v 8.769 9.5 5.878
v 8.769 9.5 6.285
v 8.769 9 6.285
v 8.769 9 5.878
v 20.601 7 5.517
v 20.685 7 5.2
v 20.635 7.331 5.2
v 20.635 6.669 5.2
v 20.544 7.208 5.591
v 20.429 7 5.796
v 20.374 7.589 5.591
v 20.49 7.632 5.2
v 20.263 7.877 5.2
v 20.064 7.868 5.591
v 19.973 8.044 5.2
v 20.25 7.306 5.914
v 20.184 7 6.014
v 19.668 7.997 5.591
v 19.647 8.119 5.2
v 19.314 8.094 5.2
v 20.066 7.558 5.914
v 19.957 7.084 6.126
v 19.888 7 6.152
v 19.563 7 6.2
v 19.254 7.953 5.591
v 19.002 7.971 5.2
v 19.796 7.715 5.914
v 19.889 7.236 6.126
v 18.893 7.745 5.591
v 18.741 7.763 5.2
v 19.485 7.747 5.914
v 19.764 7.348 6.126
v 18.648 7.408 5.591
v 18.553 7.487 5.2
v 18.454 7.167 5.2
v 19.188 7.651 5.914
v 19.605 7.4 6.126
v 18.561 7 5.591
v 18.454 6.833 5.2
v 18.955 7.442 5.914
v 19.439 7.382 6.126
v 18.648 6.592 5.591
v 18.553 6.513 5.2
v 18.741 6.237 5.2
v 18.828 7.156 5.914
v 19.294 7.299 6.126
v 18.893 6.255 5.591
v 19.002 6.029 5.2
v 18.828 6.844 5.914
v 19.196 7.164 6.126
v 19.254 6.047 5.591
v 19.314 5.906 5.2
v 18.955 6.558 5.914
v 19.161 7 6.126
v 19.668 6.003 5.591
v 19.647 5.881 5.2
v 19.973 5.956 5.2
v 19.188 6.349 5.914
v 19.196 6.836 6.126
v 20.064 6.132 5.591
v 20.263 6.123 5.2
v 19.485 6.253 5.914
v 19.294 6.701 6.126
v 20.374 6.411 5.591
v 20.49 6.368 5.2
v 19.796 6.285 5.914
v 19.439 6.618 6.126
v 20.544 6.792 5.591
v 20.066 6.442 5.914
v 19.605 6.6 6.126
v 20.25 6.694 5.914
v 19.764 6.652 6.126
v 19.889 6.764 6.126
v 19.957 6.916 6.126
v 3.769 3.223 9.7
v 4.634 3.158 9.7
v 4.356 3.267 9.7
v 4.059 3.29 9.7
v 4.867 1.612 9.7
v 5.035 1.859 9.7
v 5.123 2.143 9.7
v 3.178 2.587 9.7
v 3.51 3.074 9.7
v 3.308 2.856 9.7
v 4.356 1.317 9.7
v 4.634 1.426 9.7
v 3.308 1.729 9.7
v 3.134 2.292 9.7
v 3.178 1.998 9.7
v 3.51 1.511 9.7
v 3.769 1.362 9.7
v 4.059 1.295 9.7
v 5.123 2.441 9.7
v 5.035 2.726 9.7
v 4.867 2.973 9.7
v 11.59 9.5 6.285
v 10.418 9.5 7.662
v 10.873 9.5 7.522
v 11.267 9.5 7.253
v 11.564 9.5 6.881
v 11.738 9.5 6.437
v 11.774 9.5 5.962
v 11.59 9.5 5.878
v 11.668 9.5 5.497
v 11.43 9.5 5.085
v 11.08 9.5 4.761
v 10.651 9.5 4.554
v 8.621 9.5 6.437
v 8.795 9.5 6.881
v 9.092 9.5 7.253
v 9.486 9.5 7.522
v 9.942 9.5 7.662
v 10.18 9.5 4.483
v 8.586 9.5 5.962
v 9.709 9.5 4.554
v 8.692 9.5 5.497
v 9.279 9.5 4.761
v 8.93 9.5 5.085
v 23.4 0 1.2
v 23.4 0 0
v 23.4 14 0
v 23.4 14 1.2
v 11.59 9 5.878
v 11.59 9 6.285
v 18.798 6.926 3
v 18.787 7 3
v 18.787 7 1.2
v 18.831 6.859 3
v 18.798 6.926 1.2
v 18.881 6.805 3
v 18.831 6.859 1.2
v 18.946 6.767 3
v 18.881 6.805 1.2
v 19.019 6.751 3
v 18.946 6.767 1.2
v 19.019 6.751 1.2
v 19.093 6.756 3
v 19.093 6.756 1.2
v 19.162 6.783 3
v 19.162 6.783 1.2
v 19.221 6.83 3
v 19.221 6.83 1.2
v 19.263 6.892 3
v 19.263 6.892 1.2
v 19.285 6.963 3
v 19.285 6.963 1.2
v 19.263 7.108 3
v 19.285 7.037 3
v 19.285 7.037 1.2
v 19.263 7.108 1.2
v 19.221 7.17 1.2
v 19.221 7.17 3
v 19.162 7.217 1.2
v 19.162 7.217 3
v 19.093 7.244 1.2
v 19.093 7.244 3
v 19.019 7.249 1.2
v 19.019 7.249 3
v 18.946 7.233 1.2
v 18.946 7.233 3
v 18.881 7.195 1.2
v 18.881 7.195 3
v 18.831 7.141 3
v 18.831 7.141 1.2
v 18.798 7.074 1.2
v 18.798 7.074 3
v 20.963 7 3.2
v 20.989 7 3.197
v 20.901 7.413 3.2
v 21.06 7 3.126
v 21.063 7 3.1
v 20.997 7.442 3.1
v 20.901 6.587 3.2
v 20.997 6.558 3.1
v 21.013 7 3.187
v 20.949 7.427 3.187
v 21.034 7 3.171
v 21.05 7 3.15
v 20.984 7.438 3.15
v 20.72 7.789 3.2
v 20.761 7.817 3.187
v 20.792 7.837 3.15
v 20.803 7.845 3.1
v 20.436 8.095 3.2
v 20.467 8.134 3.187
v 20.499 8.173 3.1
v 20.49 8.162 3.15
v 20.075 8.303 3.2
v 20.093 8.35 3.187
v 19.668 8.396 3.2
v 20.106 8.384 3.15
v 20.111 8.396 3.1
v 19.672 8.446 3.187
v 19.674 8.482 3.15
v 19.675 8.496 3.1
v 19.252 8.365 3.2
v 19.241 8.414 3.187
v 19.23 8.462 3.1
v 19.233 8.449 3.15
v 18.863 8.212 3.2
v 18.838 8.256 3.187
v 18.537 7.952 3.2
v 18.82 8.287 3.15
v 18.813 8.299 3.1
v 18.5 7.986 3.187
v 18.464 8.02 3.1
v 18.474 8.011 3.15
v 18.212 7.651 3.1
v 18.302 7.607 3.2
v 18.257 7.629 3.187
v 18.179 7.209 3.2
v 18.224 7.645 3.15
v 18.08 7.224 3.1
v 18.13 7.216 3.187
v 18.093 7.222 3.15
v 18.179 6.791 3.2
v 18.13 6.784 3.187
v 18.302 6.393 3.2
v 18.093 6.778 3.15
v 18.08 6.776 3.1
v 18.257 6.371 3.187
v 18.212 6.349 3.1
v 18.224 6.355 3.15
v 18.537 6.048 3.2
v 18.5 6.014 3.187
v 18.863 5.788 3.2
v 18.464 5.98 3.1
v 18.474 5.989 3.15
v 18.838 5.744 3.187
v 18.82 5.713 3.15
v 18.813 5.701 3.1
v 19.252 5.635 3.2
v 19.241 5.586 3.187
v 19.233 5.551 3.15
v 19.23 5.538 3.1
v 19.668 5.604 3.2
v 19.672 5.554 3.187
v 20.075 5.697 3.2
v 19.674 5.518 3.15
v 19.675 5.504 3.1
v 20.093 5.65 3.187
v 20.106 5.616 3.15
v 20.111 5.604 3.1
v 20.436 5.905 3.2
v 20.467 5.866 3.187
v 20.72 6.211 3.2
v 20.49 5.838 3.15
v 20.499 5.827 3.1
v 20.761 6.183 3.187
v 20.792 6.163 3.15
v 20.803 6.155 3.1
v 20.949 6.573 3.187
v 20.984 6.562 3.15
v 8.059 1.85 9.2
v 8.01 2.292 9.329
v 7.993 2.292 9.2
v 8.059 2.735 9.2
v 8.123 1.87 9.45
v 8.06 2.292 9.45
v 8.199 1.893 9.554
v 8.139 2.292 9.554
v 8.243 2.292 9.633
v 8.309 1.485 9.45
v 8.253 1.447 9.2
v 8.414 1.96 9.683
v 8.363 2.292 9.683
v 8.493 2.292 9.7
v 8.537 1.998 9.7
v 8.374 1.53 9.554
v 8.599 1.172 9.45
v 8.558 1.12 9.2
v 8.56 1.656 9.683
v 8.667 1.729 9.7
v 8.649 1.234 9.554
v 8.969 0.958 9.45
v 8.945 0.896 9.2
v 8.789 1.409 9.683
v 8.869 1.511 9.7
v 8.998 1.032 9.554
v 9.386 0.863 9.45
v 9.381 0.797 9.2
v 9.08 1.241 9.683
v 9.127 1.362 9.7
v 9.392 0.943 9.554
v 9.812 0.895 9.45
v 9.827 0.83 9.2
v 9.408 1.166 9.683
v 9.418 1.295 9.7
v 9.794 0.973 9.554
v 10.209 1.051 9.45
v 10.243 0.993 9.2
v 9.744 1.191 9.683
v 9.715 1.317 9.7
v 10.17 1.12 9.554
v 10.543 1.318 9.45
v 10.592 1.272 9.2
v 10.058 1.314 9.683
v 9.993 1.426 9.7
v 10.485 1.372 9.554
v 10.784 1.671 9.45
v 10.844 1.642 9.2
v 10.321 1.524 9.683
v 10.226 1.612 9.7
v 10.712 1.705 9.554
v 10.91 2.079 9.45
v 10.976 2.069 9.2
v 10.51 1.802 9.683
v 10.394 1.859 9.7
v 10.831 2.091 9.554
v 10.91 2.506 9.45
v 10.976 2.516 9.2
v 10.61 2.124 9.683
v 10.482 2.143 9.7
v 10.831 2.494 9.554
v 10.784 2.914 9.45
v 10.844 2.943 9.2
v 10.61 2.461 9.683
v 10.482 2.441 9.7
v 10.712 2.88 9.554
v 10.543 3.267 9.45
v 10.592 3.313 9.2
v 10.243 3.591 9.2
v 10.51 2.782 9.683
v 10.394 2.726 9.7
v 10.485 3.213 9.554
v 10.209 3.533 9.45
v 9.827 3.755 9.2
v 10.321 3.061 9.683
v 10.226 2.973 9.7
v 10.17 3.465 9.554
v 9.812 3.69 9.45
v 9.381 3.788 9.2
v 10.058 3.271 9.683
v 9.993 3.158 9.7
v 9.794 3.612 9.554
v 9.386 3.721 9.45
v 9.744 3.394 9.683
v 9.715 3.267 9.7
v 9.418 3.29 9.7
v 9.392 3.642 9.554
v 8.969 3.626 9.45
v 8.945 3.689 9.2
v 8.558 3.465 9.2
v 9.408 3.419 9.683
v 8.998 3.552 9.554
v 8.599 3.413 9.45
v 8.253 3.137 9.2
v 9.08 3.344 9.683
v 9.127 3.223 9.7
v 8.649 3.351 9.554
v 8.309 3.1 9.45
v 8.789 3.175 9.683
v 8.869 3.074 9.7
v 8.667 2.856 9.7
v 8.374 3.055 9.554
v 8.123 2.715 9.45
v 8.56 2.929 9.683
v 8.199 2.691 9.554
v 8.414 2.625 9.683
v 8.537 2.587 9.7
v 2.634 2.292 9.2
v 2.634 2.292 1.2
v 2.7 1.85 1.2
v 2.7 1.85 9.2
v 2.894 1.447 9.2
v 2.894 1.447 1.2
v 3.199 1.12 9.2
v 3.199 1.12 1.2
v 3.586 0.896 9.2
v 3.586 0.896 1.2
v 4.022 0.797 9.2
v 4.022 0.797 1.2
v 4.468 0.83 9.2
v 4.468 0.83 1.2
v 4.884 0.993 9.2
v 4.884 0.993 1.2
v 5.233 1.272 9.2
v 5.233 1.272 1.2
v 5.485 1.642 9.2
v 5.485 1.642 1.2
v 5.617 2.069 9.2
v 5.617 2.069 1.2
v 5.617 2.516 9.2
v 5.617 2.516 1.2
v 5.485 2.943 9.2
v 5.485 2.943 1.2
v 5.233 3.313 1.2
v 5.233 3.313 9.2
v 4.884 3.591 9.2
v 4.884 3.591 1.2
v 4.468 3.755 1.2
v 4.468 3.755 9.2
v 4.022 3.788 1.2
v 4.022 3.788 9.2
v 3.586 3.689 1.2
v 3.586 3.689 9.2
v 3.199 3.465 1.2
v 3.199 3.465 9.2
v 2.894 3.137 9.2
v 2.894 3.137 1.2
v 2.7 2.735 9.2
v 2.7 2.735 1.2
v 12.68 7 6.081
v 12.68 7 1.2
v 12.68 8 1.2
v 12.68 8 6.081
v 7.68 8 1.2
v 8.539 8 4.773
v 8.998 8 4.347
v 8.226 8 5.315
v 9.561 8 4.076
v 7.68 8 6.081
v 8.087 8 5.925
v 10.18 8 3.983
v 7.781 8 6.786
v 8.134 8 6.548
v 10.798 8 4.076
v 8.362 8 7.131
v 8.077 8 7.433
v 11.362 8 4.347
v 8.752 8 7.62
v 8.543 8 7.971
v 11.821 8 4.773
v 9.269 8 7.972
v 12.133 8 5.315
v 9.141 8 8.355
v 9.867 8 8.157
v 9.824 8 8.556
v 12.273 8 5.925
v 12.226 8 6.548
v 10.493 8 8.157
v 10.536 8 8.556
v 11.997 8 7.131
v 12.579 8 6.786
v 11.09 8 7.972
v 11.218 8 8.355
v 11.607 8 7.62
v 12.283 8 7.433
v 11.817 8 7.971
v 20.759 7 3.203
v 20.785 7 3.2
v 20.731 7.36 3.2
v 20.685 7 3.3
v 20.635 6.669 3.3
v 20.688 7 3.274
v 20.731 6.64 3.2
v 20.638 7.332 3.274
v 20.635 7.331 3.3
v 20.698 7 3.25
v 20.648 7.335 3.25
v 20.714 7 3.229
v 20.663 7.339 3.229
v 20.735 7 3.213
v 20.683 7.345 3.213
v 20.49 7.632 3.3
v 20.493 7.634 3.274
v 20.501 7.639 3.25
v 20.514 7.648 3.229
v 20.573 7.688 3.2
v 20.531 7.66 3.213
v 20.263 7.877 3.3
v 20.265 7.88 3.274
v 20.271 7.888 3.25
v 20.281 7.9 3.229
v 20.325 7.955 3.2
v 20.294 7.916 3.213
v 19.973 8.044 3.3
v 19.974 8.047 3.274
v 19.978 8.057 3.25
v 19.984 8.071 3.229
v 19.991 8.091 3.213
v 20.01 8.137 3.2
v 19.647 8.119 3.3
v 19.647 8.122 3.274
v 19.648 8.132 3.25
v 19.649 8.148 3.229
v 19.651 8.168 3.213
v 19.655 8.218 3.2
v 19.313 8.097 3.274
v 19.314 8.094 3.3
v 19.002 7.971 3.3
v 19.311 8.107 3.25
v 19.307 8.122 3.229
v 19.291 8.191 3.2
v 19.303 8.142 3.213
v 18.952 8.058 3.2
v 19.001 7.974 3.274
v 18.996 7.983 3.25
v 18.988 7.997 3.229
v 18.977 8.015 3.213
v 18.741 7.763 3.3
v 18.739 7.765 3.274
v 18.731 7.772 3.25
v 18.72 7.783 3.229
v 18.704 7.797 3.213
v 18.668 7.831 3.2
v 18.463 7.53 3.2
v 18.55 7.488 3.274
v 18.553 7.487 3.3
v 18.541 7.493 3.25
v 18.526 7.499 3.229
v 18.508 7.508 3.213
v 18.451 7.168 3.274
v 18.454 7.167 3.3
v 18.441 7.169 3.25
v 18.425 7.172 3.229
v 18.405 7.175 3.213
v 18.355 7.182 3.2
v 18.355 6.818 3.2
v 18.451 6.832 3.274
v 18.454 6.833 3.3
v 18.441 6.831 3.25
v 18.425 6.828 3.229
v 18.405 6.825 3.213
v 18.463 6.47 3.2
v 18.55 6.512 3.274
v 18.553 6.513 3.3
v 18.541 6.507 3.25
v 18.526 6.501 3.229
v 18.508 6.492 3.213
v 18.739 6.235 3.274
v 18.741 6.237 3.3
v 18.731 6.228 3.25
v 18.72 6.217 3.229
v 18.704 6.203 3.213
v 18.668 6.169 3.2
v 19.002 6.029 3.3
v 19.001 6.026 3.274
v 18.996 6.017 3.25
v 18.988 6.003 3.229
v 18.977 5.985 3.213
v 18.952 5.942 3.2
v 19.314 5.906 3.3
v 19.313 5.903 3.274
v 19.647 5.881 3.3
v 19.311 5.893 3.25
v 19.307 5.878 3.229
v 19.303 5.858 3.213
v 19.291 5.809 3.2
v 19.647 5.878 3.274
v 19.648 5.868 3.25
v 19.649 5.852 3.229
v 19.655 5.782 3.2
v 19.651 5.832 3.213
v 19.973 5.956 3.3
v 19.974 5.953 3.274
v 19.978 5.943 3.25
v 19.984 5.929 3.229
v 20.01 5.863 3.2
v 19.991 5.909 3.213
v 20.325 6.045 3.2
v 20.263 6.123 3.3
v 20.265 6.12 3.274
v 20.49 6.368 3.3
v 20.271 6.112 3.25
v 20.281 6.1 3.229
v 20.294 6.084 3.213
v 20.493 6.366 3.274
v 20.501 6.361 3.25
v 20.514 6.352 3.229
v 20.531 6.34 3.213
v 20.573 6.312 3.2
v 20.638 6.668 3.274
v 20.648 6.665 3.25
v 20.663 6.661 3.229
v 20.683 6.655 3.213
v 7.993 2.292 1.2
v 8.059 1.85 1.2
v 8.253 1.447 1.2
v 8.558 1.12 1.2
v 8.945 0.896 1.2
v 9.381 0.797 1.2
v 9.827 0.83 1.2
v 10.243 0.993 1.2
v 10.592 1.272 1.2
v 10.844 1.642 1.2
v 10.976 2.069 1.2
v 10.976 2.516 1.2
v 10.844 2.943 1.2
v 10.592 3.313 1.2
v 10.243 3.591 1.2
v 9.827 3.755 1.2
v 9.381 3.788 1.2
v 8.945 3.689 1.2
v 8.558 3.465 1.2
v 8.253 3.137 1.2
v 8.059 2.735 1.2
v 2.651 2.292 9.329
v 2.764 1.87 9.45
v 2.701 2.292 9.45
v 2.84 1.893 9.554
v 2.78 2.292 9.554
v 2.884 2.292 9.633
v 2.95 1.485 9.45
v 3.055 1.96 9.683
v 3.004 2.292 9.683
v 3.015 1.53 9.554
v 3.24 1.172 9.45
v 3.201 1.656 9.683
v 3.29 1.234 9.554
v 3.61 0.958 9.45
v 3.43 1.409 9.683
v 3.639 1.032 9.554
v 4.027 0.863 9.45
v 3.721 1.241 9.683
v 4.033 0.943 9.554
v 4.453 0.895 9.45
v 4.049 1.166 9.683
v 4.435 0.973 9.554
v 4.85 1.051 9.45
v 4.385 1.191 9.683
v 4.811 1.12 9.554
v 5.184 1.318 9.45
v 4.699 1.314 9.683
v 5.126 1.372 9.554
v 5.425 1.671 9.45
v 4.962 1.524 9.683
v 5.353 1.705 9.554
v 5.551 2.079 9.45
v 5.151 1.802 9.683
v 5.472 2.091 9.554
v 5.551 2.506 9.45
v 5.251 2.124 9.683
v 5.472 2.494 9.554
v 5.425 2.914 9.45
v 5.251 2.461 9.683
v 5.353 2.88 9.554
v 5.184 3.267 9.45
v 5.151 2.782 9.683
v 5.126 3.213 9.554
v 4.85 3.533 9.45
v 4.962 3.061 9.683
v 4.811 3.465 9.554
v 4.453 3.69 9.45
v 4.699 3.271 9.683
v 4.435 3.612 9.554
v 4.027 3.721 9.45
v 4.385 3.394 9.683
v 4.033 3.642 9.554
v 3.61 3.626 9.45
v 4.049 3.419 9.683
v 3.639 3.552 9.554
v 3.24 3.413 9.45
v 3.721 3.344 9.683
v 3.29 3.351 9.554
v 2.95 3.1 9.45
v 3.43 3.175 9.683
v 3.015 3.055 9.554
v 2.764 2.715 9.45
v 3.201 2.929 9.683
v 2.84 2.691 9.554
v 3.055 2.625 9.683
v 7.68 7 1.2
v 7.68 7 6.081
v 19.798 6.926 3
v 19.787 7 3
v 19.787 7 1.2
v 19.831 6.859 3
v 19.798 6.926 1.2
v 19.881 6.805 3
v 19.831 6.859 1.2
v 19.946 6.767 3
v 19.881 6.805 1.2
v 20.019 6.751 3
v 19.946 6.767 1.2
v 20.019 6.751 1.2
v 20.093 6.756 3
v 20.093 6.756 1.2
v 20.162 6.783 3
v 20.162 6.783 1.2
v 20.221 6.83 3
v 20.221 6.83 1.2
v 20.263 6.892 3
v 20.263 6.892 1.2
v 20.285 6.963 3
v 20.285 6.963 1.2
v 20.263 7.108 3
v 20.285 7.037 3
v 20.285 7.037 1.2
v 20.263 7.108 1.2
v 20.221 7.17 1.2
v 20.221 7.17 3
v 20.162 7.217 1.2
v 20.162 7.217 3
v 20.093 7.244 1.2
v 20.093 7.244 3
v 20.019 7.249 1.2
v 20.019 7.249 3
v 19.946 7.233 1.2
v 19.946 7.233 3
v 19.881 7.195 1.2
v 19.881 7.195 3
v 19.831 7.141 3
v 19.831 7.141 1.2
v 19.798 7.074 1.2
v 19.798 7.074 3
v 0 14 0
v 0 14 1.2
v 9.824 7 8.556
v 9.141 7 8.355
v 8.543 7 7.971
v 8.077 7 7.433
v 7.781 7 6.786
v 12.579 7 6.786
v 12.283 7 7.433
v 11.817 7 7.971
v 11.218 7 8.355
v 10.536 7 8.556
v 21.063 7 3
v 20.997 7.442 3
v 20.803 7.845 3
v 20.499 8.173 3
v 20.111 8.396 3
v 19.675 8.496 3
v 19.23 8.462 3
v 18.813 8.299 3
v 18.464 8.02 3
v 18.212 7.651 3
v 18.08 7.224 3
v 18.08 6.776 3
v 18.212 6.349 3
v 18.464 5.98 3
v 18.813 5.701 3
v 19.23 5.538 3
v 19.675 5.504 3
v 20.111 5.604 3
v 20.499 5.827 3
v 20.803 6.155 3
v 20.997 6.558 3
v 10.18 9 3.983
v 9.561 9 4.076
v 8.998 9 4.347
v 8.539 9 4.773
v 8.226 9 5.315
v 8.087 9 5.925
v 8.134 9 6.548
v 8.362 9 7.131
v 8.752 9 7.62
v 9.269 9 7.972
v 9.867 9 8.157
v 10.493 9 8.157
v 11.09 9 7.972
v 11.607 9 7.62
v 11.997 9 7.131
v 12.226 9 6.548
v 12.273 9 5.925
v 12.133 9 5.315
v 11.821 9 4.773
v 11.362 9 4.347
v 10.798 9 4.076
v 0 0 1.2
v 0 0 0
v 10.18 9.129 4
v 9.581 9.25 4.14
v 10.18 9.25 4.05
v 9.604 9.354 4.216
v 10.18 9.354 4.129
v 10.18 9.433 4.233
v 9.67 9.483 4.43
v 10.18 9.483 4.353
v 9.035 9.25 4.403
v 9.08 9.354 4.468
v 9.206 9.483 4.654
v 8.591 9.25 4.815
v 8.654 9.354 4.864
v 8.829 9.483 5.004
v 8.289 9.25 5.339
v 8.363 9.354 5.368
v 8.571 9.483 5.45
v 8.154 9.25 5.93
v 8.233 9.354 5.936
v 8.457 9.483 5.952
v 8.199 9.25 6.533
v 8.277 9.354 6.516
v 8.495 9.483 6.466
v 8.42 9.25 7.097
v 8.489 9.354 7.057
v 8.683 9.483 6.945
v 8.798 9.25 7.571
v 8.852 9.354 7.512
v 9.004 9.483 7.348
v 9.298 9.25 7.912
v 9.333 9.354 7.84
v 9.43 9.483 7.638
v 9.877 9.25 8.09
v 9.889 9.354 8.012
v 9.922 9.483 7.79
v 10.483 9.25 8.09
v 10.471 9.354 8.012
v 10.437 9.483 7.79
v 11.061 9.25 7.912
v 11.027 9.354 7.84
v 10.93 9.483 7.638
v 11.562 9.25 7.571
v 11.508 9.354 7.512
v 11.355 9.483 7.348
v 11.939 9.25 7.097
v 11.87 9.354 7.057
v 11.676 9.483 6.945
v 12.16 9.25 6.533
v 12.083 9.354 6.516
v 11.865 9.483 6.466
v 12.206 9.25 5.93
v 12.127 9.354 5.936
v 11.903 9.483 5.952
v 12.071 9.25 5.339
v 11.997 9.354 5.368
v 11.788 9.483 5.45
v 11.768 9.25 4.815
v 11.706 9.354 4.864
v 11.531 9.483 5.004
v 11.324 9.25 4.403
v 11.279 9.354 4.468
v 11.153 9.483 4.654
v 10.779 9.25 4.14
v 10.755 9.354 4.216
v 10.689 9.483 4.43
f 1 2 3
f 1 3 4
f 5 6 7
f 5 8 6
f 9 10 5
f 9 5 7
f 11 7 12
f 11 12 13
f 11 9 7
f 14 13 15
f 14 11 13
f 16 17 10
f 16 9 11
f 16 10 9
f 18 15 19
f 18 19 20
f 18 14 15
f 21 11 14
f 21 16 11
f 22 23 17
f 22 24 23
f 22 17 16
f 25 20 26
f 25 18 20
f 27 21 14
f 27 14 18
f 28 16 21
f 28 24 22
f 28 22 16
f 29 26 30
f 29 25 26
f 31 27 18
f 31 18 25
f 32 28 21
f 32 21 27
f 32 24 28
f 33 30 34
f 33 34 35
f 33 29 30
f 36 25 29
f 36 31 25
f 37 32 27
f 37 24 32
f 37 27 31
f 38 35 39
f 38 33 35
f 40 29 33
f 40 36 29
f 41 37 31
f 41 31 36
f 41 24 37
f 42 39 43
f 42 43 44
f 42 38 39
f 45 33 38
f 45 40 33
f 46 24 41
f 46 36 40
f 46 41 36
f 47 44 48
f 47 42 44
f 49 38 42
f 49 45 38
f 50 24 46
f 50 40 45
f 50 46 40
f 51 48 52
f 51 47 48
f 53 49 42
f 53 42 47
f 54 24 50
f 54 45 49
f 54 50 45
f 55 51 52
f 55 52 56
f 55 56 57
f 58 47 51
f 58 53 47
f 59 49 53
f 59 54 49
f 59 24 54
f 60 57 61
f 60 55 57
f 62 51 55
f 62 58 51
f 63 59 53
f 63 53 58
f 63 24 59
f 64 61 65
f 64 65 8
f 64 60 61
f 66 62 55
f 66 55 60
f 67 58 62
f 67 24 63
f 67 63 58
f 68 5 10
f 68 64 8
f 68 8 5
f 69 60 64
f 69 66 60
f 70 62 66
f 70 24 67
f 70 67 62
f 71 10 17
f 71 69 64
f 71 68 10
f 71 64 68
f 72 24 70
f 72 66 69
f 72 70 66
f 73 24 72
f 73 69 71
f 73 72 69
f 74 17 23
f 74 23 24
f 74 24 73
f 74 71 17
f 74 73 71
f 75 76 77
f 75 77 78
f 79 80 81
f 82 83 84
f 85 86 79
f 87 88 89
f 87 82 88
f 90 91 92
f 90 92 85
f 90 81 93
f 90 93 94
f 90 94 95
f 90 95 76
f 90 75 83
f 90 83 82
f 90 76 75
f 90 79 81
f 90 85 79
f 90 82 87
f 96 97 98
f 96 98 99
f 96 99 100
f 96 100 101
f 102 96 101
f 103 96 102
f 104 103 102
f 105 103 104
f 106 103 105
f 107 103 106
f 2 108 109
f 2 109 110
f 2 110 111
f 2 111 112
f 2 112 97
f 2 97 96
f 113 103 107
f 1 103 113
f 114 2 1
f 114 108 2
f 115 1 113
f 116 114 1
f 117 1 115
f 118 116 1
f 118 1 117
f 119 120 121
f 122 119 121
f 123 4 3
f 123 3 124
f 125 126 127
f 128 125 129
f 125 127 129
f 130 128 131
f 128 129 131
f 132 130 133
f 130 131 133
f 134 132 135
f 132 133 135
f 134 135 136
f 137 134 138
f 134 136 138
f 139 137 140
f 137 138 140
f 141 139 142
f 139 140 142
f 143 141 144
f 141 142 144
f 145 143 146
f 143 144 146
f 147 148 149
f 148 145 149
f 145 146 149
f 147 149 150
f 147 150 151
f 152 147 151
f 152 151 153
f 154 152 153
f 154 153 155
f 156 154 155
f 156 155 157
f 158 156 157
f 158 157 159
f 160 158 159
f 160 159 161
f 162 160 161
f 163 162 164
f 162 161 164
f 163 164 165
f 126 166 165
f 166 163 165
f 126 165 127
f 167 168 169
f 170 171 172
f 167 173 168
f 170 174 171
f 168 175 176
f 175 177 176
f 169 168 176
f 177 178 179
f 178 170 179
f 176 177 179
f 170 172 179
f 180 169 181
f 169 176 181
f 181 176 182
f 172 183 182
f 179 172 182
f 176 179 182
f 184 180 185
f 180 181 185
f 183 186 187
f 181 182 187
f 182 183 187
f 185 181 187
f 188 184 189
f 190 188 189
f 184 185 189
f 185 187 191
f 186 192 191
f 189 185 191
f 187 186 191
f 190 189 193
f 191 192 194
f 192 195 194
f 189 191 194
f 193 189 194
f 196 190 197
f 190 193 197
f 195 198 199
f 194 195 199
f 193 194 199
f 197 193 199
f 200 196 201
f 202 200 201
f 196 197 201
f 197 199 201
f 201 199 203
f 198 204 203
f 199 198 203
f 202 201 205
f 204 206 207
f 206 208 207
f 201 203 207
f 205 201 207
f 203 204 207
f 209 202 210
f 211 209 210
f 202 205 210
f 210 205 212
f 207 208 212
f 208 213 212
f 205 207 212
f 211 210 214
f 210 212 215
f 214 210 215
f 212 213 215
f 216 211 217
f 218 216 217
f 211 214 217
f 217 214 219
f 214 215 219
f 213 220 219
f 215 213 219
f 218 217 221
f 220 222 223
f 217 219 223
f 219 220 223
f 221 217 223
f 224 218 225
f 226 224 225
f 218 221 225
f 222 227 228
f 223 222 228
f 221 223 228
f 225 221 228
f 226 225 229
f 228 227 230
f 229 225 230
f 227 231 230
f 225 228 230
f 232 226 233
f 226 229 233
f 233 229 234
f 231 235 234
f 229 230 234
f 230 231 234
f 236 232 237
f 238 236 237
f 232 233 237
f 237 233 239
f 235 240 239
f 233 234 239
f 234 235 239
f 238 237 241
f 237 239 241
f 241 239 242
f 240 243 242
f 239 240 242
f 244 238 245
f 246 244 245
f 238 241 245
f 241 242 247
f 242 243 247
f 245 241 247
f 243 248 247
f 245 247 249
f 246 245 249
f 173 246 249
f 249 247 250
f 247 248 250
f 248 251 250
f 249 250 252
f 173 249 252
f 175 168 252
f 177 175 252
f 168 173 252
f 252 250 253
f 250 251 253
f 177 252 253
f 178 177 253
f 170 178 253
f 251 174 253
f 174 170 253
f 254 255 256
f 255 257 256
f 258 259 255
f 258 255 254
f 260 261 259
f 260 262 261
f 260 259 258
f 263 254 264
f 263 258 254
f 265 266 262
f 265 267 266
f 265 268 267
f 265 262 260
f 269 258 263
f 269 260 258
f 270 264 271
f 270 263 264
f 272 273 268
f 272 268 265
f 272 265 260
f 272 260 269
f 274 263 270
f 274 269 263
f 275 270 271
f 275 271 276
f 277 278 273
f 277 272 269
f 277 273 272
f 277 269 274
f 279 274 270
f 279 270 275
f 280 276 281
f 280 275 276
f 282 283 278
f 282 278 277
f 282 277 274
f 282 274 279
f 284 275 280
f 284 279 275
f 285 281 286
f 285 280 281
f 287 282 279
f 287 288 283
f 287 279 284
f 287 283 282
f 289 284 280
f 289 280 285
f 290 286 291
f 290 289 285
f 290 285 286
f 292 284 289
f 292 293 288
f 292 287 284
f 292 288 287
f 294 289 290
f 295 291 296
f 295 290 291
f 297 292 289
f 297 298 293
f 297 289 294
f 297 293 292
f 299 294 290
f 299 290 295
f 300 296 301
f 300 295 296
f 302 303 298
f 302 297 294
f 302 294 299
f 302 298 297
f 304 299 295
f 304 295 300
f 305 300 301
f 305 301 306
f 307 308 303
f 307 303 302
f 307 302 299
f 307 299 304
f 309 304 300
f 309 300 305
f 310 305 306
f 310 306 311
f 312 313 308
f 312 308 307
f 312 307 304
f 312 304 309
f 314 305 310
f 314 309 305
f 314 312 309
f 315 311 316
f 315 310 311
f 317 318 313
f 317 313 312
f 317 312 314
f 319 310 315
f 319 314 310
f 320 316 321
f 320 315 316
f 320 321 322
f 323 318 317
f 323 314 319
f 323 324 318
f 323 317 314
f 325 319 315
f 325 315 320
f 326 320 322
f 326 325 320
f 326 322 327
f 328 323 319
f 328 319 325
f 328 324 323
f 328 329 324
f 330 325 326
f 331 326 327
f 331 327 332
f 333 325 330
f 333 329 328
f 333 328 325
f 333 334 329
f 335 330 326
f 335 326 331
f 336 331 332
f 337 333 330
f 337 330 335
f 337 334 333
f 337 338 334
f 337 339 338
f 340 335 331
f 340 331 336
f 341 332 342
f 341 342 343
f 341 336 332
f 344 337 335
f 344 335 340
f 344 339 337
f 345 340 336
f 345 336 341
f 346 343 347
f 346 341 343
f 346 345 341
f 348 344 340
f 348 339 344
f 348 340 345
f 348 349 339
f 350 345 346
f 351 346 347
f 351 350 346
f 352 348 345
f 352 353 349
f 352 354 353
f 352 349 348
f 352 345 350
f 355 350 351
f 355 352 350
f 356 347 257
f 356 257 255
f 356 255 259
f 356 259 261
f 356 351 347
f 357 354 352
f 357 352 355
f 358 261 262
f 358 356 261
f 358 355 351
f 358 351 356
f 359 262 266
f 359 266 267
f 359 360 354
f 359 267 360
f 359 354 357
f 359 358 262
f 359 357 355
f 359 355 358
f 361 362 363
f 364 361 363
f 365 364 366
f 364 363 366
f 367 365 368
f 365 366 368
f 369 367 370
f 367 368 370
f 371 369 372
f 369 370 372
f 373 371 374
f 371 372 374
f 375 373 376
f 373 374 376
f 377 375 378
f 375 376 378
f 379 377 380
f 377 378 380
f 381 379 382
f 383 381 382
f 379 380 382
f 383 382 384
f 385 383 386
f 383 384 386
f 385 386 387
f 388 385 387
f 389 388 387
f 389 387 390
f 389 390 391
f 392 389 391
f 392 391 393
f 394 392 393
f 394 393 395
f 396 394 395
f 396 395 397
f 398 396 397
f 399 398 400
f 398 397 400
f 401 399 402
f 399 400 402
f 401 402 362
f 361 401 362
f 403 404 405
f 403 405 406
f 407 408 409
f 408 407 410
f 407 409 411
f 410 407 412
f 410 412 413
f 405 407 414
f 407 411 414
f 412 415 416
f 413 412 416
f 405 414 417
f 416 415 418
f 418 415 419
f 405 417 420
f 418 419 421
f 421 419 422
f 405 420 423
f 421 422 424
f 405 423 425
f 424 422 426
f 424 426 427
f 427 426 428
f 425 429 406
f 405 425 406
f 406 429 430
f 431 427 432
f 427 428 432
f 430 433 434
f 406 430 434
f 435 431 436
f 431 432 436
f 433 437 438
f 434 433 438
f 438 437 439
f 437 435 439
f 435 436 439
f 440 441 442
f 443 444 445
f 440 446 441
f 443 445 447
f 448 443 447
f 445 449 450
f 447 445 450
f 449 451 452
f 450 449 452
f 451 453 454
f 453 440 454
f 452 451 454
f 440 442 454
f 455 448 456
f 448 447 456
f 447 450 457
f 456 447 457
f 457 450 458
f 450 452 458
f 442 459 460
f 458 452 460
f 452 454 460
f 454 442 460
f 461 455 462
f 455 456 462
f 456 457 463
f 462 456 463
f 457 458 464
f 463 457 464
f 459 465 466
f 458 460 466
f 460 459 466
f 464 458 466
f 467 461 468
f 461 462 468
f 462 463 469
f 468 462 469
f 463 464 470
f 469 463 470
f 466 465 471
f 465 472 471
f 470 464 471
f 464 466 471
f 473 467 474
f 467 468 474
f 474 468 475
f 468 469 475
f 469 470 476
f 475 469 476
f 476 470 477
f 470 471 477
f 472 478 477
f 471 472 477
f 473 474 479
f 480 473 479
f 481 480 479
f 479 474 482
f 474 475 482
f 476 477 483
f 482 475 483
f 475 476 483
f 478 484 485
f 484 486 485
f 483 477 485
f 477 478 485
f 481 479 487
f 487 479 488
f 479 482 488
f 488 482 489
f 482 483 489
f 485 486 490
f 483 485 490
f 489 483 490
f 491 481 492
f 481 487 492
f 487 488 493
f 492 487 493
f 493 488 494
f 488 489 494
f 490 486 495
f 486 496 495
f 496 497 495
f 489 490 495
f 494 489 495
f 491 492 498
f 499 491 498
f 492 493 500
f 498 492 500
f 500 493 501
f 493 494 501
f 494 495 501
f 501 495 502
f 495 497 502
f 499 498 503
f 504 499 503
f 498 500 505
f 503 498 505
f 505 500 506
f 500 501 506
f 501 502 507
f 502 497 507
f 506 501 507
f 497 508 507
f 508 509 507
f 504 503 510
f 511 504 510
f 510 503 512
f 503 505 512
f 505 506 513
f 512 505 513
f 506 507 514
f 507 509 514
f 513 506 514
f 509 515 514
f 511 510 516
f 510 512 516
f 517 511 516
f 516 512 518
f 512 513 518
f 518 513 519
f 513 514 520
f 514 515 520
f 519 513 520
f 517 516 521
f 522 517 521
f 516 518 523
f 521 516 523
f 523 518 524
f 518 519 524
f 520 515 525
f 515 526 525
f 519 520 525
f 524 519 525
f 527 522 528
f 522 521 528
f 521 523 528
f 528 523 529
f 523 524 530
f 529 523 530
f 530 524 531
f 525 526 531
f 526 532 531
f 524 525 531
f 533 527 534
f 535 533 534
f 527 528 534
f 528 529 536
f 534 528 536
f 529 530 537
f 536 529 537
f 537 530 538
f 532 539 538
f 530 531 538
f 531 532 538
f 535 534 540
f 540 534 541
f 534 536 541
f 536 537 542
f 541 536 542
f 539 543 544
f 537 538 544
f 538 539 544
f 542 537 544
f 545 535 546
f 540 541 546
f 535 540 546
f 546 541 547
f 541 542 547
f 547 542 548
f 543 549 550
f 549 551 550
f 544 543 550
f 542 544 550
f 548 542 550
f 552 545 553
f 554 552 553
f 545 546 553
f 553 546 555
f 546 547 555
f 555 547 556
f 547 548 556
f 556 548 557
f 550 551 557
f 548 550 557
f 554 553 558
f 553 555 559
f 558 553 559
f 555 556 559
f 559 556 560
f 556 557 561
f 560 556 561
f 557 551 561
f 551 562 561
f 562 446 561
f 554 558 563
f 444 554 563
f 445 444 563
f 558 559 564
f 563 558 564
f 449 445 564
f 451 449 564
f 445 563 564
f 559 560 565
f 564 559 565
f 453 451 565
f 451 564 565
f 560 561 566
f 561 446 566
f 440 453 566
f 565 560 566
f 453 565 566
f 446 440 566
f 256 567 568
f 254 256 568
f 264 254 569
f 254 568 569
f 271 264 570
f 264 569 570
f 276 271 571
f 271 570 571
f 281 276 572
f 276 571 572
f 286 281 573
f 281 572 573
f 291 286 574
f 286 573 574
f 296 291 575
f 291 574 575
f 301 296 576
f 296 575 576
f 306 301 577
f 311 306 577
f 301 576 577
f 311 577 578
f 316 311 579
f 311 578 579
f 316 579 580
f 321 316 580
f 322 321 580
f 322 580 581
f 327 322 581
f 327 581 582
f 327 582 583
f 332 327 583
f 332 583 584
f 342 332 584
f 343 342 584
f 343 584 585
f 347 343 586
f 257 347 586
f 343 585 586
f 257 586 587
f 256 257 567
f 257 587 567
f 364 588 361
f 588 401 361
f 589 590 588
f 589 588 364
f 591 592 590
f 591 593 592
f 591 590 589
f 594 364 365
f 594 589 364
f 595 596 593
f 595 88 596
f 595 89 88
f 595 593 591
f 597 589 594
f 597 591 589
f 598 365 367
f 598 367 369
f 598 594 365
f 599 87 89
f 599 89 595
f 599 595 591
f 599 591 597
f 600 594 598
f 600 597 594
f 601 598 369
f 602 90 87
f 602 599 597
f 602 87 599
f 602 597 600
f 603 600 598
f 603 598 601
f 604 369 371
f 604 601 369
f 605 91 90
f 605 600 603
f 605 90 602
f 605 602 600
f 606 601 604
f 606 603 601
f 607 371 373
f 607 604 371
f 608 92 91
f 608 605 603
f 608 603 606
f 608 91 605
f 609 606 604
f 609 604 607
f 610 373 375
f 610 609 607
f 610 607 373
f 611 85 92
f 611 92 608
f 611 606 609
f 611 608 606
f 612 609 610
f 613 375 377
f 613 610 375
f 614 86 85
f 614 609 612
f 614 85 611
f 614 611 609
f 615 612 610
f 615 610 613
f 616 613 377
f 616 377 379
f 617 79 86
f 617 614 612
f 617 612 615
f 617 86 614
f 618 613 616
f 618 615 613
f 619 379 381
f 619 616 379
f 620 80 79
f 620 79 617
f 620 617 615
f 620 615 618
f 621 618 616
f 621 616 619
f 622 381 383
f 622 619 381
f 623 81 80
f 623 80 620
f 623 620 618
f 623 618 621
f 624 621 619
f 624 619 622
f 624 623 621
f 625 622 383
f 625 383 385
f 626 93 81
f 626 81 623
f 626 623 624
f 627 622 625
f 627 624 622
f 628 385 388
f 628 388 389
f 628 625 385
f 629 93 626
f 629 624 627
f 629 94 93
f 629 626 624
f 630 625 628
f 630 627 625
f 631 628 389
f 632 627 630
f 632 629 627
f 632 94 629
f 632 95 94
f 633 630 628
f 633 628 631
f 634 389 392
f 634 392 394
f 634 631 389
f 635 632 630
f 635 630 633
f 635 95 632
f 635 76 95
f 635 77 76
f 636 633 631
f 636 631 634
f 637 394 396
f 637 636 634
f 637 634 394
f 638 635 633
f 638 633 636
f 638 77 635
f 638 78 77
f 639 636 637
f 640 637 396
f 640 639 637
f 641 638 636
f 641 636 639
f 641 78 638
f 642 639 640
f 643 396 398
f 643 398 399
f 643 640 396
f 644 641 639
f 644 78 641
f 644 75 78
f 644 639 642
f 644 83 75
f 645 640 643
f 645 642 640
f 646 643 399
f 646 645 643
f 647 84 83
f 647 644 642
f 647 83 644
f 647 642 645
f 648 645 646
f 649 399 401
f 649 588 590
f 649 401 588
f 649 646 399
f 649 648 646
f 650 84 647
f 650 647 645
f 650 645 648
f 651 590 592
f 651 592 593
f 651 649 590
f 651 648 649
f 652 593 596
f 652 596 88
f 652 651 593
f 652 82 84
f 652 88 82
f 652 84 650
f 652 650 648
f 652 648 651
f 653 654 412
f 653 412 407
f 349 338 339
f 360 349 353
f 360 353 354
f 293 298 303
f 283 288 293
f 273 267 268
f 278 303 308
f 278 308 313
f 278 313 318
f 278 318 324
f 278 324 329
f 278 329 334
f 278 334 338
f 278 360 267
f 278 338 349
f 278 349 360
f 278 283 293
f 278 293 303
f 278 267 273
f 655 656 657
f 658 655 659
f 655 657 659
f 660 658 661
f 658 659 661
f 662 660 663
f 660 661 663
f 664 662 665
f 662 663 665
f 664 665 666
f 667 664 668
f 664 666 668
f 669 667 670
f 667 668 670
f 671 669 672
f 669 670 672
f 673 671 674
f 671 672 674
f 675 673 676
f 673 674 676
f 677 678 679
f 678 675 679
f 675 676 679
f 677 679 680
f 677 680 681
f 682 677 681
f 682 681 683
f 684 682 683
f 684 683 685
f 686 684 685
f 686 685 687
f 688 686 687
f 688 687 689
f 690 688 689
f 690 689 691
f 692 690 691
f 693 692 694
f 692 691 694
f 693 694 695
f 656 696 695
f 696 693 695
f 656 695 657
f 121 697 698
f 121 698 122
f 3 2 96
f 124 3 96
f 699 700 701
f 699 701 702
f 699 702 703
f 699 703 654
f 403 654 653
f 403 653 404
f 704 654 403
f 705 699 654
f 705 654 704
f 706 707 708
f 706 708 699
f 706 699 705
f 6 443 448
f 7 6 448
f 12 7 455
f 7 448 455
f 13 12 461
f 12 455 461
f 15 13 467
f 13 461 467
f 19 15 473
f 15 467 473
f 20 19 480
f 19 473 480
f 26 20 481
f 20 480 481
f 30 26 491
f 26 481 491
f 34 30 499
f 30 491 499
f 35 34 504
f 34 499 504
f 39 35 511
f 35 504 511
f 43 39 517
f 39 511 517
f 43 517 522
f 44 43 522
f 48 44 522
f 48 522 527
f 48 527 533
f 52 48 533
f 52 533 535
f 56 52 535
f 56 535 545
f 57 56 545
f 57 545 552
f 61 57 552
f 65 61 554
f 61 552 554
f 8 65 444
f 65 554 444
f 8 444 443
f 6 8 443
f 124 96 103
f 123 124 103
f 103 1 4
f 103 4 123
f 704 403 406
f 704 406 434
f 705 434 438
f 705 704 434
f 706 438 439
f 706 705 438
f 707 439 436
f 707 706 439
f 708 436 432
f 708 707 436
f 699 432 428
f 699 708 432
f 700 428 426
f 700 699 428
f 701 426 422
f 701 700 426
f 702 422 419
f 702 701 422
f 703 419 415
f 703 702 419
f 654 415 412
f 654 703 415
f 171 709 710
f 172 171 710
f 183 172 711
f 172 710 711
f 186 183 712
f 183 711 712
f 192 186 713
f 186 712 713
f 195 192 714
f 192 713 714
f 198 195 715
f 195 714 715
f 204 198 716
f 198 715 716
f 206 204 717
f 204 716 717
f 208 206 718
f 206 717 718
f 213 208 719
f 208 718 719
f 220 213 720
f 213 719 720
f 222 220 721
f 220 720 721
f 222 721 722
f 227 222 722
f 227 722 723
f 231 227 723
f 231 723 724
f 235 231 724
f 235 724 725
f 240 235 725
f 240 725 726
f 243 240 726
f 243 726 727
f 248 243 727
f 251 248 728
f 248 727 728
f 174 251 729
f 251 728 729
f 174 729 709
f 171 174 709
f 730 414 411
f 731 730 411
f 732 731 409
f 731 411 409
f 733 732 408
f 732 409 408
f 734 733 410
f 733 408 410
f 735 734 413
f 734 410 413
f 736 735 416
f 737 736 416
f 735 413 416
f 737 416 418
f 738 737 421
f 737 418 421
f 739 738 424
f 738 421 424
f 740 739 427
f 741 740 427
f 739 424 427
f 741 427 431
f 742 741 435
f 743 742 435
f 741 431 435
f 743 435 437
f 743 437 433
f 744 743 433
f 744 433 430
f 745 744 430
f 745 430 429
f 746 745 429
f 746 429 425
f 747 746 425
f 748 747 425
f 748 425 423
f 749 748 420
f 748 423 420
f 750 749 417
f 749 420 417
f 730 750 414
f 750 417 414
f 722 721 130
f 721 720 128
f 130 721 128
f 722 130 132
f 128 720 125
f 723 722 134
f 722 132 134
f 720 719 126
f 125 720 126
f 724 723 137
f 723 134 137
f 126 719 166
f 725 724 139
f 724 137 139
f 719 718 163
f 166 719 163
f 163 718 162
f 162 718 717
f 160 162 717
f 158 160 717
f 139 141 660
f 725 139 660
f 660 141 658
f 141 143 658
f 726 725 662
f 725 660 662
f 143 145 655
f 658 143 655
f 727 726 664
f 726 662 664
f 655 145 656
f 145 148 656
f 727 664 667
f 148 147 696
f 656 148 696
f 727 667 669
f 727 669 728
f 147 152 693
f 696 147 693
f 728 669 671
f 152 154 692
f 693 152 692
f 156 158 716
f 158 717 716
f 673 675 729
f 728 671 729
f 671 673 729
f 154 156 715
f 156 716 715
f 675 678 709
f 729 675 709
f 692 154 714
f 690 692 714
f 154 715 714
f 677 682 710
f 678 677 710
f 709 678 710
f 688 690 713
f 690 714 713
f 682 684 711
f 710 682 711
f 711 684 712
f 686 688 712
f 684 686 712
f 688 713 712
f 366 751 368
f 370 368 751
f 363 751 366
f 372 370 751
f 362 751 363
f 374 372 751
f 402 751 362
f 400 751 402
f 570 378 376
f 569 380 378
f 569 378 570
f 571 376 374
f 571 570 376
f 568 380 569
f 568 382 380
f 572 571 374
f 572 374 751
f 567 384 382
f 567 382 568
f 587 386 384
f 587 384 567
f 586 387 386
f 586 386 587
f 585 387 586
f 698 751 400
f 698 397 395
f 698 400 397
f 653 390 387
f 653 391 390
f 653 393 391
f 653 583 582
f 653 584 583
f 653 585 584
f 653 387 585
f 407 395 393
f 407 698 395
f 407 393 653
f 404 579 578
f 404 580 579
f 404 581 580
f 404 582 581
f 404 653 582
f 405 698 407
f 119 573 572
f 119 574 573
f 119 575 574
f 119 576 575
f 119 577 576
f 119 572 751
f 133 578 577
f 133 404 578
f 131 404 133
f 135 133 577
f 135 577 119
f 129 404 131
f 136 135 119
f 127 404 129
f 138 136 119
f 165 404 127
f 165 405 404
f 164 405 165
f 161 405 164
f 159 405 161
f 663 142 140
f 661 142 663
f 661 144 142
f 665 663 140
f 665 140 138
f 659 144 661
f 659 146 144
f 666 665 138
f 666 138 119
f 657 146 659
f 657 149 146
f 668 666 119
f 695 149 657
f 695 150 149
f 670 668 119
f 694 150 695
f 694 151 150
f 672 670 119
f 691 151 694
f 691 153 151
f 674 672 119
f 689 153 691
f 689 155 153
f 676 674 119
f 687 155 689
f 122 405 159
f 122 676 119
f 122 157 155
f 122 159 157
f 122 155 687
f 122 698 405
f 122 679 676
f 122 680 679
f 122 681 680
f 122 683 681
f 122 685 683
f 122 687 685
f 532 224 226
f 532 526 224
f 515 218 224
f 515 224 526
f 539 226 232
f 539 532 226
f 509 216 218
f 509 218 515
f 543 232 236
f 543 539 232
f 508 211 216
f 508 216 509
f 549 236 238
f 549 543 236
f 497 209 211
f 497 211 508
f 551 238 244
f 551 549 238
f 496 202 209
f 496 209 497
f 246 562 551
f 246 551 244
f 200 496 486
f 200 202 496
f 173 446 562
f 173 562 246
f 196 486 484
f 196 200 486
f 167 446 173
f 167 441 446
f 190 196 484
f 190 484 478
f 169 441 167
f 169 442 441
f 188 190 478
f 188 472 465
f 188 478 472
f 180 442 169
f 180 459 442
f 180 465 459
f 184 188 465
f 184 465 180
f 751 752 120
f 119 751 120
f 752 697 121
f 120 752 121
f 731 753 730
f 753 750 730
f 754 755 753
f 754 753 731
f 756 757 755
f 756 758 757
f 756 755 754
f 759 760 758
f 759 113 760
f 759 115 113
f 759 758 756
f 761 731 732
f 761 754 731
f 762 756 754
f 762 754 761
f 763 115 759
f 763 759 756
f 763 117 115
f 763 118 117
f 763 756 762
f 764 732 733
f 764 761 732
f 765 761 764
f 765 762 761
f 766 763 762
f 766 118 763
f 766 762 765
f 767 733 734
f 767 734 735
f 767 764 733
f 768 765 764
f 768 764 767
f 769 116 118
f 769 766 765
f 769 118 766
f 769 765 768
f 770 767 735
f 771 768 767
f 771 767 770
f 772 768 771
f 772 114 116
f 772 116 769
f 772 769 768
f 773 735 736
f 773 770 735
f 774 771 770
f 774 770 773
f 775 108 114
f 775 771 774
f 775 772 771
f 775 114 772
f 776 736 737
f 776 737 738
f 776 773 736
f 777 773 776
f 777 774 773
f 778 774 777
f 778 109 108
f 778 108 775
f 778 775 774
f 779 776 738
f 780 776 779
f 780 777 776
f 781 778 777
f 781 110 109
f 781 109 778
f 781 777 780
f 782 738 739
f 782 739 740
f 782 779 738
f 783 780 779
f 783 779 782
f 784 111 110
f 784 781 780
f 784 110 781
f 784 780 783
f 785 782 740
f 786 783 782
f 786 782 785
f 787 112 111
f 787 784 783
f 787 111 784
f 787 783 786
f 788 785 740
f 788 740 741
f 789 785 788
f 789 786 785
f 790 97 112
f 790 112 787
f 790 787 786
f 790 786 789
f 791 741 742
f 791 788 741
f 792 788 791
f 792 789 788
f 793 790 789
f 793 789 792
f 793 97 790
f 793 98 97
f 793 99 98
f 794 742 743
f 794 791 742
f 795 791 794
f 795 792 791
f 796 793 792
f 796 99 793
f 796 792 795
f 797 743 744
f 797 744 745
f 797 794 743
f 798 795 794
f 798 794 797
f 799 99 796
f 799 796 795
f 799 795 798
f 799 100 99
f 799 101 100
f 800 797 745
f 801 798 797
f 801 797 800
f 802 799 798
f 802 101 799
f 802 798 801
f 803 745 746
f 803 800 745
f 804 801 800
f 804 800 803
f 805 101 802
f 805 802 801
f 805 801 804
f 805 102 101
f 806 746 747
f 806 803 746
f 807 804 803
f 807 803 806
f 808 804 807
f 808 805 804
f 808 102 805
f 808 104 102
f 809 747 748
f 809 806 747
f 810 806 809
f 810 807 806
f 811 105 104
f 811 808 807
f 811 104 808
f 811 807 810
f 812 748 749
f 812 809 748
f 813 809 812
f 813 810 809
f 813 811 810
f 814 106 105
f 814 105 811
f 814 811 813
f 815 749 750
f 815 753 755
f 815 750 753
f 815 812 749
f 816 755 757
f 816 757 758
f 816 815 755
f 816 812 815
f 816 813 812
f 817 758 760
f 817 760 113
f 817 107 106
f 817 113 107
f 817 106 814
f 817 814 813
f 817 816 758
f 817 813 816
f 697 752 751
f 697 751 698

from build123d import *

# Parameters (mm, degrees)
SKETCH_1_W          = 23.4
SKETCH_1_H          = 14
EXTRUDE_1_DEPTH     = 1.2
SKETCH_5_R          = 0.25
EXTRUDE_3_DEPTH     = 2
SKETCH_6_R          = 1.5
EXTRUDE_4_DEPTH     = 0.2
SKETCH_7_R          = 1.121766596
EXTRUDE_5_DEPTH     = 2
DOME_1_FACE_RADIUS  = 1.121766596
DOME_1_HEIGHT       = 1
FILLET_1_R          = 0.1
EXTRUDE_6_DEPTH     = 1
SKETCH_9_R          = 2.098614602
EXTRUDE_7_DEPTH     = 1.5
FILLET_2_R          = 0.5
SKETCH_10_W         = 2.821024734
SKETCH_10_H         = 0.406660996
CUT_EXTRUDE_1_DEPTH = 0.5
SKETCH_11_R         = 1.5
EXTRUDE_8_DEPTH     = 8.5
FILLET_3_R          = 0.5


with BuildPart() as part:
    # Эскиз1 → Бобышка-Вытянуть1 (new body)
    with BuildSketch(Plane.XY):
        with Locations((11.7, 7)):
            Rectangle(SKETCH_1_W, SKETCH_1_H)
    extrude(amount=EXTRUDE_1_DEPTH)

    # Эскиз5 → Бобышка-Вытянуть3 (add)
    with BuildSketch(Plane.XY.offset(1.2)):
        with Locations(Location((20.037318808, 7, 0), (0, 0, 180))):
            Circle(SKETCH_5_R)
        with Locations(Location((19.037318808, 7, 0), (0, 0, 180))):
            Circle(SKETCH_5_R)
    extrude(amount=EXTRUDE_3_DEPTH)

    # Эскиз6 → Бобышка-Вытянуть4 (add)
    with BuildSketch(Plane.XY.offset(3)):
        with Locations((19.563312514, 7)):
            Circle(SKETCH_6_R)
    extrude(amount=EXTRUDE_4_DEPTH)

    # Эскиз7 → Бобышка-Вытянуть5 (add)
    with BuildSketch(Plane.XY.offset(3.2)):
        with Locations((19.563312514, 7)):
            Circle(SKETCH_7_R)
    extrude(amount=EXTRUDE_5_DEPTH)

    # Купол1: a dome of height H over a round flat face of radius A is a cap of a sphere of radius (A * A + H * H) / (2 * H)
    dome_1_r = (DOME_1_FACE_RADIUS * DOME_1_FACE_RADIUS + DOME_1_HEIGHT * DOME_1_HEIGHT) / (2 * DOME_1_HEIGHT)
    dome_1_base = Plane((19.563312514, 7, 5.2), z_dir=(0, 0, 1))
    with Locations(dome_1_base.offset(DOME_1_HEIGHT - dome_1_r)):
        dome_1_ball = Sphere(dome_1_r, mode=Mode.PRIVATE)
    add(split(dome_1_ball, bisect_by=dome_1_base, keep=Keep.TOP, mode=Mode.PRIVATE))

    # Скругление1
    fillet_1_edges = [part.edges().sort_by_distance(p)[0] for p in [
        (18.063312514, 7, 3.2),
        (18.441545917, 7, 3.2),
    ]]
    fillet(fillet_1_edges, radius=FILLET_1_R)

    # Эскиз8 → Бобышка-Вытянуть6 (add)
    with BuildSketch(Plane(origin=(0, 7, 0), x_dir=(-1, 0, 0), z_dir=(0, 1, 0))):
        with BuildLine():
            Line((-12.679803448, 1.2), (-12.679803448, 6.081401921))
            ThreePointArc((-12.679803448, 6.081401921), (-10.179803448, 8.581401921), (-7.679803448, 6.081401921))
            Line((-7.679803448, 6.081401921), (-7.679803448, 1.2))
            Line((-7.679803448, 1.2), (-12.679803448, 1.2))
        make_face()
    extrude(amount=EXTRUDE_6_DEPTH)

    # Эскиз9 → Бобышка-Вытянуть7 (add)
    with BuildSketch(Plane(origin=(0, 8, 0), x_dir=(1, 0, 0), z_dir=(0, 1, 0))):
        with Locations(Location((10.179803448, -6.081401921, 0), (0, 0, 90))):
            Circle(SKETCH_9_R)
    extrude(amount=EXTRUDE_7_DEPTH)

    # Скругление2
    fillet_2_edges = [part.edges().sort_by_distance(p)[0] for p in [
        (10.179803448, 9.5, 8.180016523),
    ]]
    fillet(fillet_2_edges, radius=FILLET_2_R)

    # Эскиз10 → Вырез-Вытянуть1 (cut)
    with BuildSketch(Plane(origin=(0, 9.5, 0), x_dir=(1, 0, 0), z_dir=(0, 1, 0))):
        with Locations((10.179803448, -6.081401921)):
            Rectangle(SKETCH_10_W, SKETCH_10_H)
    extrude(amount=-CUT_EXTRUDE_1_DEPTH, mode=Mode.SUBTRACT)

    # Эскиз11 → Бобышка-Вытянуть8 (add)
    with BuildSketch(Plane.XY.offset(1.2)):
        with Locations(Location((4.133843488, 2.292422246, 0), (0, 0, 180))):
            Circle(SKETCH_11_R)
        with Locations(Location((9.492802765, 2.292422246, 0), (0, 0, 180))):
            Circle(SKETCH_11_R)
    extrude(amount=EXTRUDE_8_DEPTH)

    # Скругление3
    fillet_3_edges = [part.edges().sort_by_distance(p)[0] for p in [
        (5.633843488, 2.292422246, 9.7),
        (10.992802765, 2.292422246, 9.7),
    ]]
    fillet(fillet_3_edges, radius=FILLET_3_R)


solid = part.part
